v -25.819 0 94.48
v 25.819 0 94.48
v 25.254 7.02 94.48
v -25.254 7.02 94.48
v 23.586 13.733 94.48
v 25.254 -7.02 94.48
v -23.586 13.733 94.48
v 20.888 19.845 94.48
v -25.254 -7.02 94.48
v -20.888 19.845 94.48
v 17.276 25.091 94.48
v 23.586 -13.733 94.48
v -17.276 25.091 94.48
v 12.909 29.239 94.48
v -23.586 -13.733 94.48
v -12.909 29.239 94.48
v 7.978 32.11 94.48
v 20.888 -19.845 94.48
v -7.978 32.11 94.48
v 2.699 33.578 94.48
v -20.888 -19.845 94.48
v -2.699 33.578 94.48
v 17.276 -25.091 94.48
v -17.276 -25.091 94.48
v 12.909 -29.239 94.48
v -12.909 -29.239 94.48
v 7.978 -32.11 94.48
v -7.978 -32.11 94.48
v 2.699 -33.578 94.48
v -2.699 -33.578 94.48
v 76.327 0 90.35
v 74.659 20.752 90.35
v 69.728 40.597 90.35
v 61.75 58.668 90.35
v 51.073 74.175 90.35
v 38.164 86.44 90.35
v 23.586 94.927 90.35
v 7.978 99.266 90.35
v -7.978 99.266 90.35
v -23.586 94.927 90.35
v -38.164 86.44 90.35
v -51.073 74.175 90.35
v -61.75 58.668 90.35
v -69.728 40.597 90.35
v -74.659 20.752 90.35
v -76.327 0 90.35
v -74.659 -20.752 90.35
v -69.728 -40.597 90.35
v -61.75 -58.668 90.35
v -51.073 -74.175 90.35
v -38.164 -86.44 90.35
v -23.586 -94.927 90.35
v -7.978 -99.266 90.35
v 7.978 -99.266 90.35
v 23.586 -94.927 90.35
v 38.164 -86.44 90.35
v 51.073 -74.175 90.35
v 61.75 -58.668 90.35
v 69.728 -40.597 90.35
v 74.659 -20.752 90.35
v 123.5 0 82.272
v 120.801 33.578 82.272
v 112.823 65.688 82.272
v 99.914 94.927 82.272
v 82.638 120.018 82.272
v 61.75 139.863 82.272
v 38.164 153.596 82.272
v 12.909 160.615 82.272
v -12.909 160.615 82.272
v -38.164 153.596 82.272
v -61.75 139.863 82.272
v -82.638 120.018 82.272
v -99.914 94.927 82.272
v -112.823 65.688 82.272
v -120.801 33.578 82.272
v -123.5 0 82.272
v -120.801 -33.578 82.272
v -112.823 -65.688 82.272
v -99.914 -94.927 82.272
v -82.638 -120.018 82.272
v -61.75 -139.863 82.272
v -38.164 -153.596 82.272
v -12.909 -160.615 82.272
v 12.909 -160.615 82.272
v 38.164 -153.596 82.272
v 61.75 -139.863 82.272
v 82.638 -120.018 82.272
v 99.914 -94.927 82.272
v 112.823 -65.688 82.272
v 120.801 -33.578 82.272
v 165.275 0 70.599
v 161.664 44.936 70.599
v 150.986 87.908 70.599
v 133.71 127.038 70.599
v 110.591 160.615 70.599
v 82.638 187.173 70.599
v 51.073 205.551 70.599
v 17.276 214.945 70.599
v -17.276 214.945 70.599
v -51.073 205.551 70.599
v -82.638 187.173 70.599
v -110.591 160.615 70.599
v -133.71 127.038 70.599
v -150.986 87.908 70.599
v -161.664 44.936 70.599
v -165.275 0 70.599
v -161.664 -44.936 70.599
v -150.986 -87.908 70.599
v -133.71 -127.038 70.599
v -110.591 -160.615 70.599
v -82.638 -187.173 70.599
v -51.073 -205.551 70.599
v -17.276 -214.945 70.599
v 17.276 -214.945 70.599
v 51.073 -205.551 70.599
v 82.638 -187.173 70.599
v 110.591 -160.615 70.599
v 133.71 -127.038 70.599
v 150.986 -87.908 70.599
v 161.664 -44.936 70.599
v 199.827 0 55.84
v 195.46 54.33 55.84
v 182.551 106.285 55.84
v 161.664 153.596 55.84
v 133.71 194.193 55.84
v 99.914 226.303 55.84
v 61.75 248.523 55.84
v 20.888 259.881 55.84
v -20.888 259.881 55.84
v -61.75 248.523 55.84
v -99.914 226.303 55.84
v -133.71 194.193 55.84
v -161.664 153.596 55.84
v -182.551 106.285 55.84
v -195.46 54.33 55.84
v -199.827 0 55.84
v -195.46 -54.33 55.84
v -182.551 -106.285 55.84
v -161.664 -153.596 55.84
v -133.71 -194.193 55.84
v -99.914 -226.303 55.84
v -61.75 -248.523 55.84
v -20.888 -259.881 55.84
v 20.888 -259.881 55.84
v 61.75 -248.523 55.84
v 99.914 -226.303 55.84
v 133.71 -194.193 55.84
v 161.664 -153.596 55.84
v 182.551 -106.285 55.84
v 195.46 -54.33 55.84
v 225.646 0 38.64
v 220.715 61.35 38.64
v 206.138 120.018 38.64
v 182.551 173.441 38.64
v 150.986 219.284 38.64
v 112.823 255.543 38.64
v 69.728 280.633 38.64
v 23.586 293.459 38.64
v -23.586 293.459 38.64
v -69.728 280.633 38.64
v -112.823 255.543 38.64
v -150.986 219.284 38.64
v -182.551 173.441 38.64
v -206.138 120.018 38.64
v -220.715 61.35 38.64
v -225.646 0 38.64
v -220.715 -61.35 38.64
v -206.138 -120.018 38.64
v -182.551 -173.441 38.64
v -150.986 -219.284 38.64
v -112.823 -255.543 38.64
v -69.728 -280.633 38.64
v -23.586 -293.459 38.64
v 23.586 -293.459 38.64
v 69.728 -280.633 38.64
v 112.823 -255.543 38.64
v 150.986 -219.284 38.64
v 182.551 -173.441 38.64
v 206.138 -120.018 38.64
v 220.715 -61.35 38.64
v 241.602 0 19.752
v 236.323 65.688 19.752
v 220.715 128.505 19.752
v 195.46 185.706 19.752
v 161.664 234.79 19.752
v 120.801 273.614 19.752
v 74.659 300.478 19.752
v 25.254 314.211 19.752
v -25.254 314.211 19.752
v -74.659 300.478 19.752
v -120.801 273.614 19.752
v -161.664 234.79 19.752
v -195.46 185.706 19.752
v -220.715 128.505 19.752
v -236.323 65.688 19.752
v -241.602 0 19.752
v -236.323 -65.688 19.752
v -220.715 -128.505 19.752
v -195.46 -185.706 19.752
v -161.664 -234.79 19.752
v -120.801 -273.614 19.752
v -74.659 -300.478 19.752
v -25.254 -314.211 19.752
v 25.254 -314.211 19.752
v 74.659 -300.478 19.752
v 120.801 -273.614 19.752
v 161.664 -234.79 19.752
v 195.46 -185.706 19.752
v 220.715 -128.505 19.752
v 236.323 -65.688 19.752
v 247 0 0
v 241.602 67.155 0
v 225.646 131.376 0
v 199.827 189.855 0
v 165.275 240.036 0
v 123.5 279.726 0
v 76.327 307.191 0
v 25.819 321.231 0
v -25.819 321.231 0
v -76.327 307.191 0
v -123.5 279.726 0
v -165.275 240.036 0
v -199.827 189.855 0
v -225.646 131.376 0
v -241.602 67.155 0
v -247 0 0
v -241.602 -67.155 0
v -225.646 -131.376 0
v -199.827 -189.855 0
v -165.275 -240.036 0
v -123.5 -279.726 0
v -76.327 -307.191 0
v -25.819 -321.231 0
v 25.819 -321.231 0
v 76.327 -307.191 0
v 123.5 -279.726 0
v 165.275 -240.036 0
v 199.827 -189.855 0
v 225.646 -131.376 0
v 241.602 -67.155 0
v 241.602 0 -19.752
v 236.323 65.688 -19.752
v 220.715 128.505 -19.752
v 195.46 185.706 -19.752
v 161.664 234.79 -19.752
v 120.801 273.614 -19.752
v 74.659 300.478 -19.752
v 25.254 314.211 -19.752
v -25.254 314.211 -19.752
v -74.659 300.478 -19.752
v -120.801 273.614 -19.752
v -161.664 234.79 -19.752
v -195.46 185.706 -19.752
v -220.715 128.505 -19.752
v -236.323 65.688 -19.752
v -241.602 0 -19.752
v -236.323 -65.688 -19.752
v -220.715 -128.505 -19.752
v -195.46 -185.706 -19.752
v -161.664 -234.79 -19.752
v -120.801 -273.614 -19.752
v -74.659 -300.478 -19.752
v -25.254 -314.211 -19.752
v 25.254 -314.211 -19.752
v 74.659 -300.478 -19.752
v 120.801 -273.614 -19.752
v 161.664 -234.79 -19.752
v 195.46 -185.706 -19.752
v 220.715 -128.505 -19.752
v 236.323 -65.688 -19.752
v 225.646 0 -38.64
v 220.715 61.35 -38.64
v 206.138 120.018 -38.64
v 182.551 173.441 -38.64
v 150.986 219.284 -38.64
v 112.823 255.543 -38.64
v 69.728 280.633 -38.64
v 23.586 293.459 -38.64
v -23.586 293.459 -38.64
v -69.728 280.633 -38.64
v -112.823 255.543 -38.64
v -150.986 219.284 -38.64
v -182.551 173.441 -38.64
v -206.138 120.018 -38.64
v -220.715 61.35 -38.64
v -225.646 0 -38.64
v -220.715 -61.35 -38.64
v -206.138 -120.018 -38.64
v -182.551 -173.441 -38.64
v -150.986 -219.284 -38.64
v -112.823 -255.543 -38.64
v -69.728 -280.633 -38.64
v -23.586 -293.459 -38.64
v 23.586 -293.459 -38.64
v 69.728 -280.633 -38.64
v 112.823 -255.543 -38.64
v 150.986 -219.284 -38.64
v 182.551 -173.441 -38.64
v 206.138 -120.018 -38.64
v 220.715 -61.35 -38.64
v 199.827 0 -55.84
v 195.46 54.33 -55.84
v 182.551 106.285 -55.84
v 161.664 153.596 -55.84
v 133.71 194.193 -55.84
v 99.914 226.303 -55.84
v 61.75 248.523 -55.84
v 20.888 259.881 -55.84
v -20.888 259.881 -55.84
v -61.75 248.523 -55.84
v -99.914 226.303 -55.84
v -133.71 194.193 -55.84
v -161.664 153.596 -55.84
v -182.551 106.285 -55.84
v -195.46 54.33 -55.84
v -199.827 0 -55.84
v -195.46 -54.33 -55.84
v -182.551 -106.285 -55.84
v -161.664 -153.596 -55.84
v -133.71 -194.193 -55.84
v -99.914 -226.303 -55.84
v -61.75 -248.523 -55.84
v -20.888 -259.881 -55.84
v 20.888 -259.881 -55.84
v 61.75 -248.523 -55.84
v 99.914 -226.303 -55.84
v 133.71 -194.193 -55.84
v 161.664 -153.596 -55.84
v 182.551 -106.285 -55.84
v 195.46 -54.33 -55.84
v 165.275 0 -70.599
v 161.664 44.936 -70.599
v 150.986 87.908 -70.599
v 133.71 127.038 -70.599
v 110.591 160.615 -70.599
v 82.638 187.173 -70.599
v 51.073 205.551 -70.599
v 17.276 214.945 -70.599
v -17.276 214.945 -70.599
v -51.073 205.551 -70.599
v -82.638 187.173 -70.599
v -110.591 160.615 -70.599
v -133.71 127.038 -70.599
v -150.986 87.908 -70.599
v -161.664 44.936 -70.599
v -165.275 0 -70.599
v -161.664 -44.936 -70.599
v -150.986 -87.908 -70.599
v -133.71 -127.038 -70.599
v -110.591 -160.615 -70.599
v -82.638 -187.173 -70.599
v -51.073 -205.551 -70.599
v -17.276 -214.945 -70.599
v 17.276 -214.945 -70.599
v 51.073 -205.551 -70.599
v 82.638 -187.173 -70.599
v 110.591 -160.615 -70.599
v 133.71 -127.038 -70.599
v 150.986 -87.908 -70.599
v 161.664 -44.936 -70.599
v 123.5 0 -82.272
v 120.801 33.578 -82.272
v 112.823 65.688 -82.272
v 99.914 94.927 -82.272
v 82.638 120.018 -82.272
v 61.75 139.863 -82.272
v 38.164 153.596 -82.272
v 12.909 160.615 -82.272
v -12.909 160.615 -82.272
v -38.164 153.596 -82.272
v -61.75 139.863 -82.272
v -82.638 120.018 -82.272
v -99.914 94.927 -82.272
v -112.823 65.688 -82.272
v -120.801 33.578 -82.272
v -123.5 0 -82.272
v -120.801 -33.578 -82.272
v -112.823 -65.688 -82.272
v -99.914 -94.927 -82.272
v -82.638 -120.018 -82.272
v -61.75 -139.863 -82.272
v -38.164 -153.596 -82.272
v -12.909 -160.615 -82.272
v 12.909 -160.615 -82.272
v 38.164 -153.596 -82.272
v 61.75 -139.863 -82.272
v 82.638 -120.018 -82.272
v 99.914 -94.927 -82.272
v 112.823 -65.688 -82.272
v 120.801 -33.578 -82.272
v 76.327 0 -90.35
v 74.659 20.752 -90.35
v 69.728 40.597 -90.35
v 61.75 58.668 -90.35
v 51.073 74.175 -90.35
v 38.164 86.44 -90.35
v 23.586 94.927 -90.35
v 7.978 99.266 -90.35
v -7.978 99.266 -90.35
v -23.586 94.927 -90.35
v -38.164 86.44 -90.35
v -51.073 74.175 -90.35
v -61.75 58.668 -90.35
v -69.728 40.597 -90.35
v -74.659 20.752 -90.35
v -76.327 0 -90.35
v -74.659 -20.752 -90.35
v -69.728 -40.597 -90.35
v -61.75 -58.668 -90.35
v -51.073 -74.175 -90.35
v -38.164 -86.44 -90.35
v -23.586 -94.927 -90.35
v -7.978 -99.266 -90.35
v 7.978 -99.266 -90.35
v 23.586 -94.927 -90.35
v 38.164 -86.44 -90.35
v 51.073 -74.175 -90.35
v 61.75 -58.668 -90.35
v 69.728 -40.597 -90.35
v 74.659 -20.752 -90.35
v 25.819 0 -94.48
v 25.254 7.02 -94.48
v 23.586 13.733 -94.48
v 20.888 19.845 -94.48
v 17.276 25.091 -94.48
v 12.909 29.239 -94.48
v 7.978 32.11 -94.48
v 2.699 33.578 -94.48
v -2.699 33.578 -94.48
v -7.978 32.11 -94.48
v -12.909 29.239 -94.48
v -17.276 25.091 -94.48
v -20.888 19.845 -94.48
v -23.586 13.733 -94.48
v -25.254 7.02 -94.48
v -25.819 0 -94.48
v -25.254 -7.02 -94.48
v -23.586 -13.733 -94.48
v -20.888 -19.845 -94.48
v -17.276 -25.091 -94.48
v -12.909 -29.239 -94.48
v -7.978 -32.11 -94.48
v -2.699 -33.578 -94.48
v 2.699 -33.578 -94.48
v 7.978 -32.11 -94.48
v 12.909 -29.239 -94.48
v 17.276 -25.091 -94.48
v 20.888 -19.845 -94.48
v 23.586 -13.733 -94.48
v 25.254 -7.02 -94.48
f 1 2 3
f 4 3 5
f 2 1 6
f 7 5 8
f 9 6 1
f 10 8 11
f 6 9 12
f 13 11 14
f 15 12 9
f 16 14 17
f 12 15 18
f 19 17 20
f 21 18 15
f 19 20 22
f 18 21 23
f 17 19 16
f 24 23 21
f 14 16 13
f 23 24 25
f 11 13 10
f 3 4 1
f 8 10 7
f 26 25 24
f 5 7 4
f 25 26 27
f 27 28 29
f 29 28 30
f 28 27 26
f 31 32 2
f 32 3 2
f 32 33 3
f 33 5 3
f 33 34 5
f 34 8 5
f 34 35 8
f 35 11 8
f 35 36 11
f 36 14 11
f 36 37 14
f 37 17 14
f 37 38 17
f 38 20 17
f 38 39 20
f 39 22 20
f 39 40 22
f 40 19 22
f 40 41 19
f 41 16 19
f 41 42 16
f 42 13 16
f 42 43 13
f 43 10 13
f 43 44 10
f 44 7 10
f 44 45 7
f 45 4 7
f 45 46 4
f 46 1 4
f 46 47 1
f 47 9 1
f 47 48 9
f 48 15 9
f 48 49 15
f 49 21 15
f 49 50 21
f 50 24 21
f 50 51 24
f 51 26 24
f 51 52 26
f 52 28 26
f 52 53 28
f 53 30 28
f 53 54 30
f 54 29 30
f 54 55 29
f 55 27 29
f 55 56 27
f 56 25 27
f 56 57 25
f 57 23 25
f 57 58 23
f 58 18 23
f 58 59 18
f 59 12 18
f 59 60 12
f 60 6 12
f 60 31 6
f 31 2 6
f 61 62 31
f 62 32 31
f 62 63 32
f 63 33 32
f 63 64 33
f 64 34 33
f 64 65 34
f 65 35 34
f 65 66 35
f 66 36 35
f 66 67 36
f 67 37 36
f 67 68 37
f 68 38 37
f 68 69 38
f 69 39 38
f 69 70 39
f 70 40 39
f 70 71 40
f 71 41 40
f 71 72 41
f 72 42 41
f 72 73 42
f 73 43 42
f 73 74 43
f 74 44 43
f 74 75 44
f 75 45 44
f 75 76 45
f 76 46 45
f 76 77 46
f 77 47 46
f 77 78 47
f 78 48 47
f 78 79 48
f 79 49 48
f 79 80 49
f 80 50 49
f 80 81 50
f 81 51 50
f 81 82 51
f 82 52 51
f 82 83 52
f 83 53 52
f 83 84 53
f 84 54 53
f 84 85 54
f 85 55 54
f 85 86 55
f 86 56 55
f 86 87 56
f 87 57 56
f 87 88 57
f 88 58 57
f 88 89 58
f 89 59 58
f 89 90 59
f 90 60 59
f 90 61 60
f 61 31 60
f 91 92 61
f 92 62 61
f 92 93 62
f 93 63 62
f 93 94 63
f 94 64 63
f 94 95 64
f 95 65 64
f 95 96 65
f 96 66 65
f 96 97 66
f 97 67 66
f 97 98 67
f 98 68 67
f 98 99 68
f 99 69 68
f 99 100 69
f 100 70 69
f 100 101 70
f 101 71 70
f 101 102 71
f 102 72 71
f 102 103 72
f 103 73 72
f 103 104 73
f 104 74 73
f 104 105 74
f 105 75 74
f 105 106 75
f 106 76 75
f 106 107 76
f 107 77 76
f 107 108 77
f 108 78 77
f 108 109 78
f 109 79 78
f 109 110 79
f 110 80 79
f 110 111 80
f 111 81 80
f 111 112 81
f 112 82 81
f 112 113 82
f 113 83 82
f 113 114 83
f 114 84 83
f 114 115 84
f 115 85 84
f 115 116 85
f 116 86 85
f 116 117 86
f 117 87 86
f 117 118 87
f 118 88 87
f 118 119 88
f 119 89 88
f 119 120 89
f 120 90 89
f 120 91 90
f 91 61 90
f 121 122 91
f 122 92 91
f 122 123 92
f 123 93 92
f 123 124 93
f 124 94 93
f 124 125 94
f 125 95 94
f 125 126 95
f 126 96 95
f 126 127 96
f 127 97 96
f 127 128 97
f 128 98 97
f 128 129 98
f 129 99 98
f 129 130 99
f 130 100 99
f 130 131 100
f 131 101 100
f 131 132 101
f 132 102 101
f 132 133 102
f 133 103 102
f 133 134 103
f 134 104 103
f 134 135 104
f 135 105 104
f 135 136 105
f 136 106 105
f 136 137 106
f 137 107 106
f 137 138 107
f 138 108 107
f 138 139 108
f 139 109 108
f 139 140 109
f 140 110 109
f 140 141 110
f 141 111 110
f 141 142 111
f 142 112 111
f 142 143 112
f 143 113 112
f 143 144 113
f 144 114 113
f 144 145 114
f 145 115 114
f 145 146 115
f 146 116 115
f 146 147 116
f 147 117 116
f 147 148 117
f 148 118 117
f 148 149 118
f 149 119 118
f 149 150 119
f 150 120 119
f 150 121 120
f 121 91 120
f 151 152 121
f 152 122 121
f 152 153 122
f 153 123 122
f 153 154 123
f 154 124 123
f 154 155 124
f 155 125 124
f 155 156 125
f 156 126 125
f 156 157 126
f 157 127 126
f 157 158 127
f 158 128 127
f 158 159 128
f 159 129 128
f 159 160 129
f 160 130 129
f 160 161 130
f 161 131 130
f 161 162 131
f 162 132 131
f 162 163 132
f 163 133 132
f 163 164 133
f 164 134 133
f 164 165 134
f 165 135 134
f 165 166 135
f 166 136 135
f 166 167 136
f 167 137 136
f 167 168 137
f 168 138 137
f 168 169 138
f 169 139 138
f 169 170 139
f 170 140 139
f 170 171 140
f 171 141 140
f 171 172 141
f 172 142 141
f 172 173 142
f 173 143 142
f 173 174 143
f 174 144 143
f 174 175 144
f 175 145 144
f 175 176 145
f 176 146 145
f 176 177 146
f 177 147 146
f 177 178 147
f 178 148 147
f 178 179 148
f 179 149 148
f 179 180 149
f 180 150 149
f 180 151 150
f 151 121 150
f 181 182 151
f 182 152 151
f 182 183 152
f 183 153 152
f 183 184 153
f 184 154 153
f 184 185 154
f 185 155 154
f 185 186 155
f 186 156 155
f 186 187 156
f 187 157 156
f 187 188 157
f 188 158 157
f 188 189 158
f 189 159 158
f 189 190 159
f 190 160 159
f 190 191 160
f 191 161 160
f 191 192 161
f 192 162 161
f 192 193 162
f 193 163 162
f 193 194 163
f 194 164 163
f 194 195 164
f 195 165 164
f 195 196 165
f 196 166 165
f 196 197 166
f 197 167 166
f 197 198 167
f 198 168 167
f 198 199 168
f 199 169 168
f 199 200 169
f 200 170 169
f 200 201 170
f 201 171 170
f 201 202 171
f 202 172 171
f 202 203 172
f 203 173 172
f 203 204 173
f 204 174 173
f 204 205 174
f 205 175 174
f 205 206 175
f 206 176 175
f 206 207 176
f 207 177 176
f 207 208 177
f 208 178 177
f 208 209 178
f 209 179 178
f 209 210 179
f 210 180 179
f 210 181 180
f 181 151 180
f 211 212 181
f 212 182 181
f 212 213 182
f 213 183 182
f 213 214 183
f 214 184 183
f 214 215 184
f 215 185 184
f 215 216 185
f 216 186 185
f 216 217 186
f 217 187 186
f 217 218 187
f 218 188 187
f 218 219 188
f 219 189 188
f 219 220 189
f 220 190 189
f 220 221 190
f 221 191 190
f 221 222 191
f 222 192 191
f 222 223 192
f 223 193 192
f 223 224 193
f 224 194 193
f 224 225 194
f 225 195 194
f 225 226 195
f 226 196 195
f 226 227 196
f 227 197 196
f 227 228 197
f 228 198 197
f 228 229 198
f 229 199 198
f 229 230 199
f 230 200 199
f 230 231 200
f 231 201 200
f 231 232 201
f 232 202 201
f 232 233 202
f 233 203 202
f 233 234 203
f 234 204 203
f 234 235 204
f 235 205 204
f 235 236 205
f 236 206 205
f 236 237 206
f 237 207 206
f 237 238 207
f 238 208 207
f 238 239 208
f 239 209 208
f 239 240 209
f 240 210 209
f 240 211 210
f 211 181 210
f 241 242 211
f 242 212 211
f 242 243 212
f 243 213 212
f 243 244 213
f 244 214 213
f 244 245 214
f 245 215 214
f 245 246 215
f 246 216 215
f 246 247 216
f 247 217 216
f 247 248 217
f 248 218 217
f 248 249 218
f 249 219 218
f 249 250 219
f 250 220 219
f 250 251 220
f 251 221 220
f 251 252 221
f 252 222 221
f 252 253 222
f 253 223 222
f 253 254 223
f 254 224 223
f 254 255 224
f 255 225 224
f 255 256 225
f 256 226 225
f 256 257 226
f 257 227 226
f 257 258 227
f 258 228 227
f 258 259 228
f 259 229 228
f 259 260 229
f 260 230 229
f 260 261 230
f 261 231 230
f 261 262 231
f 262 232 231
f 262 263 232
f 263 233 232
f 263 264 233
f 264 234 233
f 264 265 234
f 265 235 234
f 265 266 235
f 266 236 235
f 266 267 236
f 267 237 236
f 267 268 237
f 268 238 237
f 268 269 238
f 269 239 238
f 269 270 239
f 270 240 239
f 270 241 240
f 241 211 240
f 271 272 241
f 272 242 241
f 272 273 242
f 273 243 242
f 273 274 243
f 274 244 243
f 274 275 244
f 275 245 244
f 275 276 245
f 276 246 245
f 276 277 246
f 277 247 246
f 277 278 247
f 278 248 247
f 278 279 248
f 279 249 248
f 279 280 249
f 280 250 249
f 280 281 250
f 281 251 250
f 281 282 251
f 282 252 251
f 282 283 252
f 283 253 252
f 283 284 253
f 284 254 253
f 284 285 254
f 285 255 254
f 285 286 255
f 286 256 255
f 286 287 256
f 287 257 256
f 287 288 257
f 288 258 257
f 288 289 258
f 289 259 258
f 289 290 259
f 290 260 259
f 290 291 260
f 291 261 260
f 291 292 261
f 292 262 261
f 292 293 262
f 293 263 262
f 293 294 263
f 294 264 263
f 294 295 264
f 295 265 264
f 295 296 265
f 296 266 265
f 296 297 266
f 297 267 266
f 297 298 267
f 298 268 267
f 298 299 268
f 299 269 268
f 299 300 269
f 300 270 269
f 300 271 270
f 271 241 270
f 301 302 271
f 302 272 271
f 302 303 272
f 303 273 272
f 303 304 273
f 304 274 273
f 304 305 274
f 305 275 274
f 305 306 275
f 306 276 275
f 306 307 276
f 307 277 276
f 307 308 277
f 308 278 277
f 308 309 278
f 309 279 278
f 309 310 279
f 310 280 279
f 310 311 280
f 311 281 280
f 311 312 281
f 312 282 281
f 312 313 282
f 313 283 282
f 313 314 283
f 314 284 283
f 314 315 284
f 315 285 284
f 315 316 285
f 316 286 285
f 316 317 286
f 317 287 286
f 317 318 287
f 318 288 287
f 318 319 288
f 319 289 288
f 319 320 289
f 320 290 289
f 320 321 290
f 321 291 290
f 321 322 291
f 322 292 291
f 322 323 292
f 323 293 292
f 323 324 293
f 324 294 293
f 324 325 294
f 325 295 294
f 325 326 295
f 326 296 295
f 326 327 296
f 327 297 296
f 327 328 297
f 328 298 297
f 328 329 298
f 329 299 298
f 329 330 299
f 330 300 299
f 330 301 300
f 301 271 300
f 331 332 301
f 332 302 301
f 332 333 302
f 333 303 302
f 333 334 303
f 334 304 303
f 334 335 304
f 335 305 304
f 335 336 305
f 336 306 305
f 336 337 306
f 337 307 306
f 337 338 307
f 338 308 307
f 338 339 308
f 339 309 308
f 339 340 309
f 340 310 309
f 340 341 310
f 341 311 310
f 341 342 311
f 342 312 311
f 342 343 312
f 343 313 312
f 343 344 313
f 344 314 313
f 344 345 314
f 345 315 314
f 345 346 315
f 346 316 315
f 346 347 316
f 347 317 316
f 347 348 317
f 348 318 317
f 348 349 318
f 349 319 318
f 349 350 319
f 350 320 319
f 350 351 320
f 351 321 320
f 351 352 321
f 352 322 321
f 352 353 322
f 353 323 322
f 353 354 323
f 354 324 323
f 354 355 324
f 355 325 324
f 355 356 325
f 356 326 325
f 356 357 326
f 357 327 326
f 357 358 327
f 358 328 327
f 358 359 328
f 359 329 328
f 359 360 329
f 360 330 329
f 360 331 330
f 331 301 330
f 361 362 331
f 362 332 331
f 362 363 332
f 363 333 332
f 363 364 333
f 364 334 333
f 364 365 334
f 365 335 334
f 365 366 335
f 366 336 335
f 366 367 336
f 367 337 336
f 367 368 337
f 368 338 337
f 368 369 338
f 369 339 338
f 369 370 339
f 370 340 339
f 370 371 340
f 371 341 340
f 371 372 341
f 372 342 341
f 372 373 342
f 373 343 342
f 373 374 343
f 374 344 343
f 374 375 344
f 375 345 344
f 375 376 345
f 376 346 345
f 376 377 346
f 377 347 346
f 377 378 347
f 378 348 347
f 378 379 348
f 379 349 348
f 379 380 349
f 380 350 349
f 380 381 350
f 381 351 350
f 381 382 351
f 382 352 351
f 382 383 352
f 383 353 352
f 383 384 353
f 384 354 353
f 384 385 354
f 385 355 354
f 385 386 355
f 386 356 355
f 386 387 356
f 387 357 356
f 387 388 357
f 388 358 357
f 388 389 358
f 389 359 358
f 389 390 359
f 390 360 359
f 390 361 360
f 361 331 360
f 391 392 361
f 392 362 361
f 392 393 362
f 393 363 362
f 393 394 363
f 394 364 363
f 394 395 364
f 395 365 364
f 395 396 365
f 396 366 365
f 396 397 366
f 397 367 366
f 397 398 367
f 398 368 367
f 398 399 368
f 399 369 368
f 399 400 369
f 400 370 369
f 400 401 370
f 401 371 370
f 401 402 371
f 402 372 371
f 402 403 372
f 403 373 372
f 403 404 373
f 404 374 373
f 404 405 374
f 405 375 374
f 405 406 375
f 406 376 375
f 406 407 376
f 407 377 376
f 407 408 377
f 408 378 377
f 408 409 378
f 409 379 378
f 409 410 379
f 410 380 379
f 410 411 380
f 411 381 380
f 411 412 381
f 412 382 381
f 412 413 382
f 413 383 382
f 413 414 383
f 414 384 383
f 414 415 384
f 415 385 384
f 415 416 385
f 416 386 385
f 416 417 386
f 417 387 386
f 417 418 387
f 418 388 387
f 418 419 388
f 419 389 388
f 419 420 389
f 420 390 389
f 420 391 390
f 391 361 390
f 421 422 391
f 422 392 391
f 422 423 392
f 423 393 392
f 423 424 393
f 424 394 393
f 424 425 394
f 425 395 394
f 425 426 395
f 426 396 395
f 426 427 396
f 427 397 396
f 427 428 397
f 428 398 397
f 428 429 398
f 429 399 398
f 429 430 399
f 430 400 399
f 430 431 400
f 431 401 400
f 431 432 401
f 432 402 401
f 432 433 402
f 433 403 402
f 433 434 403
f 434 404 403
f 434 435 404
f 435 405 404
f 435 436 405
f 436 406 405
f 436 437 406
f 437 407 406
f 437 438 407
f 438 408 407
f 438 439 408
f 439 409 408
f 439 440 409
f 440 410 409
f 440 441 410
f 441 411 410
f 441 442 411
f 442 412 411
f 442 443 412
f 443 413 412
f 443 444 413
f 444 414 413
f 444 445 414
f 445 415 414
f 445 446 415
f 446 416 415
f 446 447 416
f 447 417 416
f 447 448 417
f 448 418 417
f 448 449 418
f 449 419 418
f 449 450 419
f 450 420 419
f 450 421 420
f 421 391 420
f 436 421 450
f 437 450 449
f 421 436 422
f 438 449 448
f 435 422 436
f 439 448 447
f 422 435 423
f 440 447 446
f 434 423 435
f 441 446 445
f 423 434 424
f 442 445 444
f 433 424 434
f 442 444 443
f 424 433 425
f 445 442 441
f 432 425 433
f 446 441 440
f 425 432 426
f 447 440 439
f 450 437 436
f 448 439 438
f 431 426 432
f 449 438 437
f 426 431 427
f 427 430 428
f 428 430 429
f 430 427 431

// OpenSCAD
// Generated by SolidPython 1.0.1 on 2020-07-29 00:46:51


scale(v = [13, 17, 5]) {
	sphere(r = 19);
}
/***********************************************
*********      SolidPython code:      **********
************************************************
 
# import packages: SolidPython
from solid import *
from solid.utils import *
from itertools import chain, combinations, permutations


class Resize:

    def __init__(self, scad_file):
        self.scad_file = scad_file
        #self.scad_file = import_scad(scad_file)
        # cone/cylinder param:
        self.r1 = 0
        self.r2 = 0
        self.h = 0
        # rectangular prism param:
        self.w = 0
        self.l = 0
        # ellipse param:
        self.r = 0

    # import OpenScad code (file name corresponds to shape)


    # classify shape + parameters
    def assign(self, param1, param2, param3):
        if self.scad_file == 'cone.scad':
            self.r1 = param1
            self.r2 = param2
            self.h = param3
        elif self.scad_file == 'cylinder.scad':
            self.r1 = param1
            self.r2 = param2
            self.h = param3
        elif self.scad_file == 'rectangularPrism.scad':
            self.h = param1
            self.l = param2
            self.w = param3
        else:
            self.r = param1
            self.h = param2

    # resize parameters
    def iterate(self):
        x = range(3, 20, 2)
        i = 1
        if self.scad_file == 'cone.scad':
            tempList = list(permutations(x, 2))
            for temp in tempList:
                param1 = temp[0]
                param2 = temp[1]
                filepath = 'produced_scad_files/' + 'cone' + str(param1) + '_' + str(param2) + '_' + '.scad'
                scad_render_to_file(cylinder(h=param1, r1=param2, r2=0), filepath)

        elif self.scad_file == 'cylinder.scad':
            tempList = list(permutations(x, 3))
            for temp in tempList:
                param1 = temp[0]
                param2 = temp[1]
                filepath = 'produced_scad_files/' + 'cylinder' + str(param1) + '_' + str(param2) + '_' + '.scad'
                scad_render_to_file(cylinder(h=param1, r1=param2, r2=param2), filepath)

        elif self.scad_file == 'rectangularPrism.scad':
            tempList = list(permutations(x, 3))
            for temp in tempList:
                param1 = temp[0]
                param2 = temp[1]
                param3 = temp[2]
                filepath = 'produced_scad_files/' + 'rectangularPrism' + str(param1) + '_' + str(param2) + '_' + str(
                    param3) + '.scad'
                scad_render_to_file(cube(size=(param1, param2, param3)), filepath)

        elif self.scad_file == 'ellipse.scad':
            tempList = list(permutations(x, 4))
            for temp in tempList:
                param1 = temp[0]
                param2 = temp[1]
                param3 = temp[2]
                param4 = temp[3]
                filepath = 'produced_scad_files/' + 'ellipse' + str(param1) + '_' + str(param2) + '_' + str(param3) + '_' + str(param4) + '.scad'
                scad_render_to_file(scale([param1, param2, param3])(sphere(r=param4)), filepath)

    def render_to_scadfile(self):
        scad_render_to_file(scad, 'example.scad') 
 
************************************************/
